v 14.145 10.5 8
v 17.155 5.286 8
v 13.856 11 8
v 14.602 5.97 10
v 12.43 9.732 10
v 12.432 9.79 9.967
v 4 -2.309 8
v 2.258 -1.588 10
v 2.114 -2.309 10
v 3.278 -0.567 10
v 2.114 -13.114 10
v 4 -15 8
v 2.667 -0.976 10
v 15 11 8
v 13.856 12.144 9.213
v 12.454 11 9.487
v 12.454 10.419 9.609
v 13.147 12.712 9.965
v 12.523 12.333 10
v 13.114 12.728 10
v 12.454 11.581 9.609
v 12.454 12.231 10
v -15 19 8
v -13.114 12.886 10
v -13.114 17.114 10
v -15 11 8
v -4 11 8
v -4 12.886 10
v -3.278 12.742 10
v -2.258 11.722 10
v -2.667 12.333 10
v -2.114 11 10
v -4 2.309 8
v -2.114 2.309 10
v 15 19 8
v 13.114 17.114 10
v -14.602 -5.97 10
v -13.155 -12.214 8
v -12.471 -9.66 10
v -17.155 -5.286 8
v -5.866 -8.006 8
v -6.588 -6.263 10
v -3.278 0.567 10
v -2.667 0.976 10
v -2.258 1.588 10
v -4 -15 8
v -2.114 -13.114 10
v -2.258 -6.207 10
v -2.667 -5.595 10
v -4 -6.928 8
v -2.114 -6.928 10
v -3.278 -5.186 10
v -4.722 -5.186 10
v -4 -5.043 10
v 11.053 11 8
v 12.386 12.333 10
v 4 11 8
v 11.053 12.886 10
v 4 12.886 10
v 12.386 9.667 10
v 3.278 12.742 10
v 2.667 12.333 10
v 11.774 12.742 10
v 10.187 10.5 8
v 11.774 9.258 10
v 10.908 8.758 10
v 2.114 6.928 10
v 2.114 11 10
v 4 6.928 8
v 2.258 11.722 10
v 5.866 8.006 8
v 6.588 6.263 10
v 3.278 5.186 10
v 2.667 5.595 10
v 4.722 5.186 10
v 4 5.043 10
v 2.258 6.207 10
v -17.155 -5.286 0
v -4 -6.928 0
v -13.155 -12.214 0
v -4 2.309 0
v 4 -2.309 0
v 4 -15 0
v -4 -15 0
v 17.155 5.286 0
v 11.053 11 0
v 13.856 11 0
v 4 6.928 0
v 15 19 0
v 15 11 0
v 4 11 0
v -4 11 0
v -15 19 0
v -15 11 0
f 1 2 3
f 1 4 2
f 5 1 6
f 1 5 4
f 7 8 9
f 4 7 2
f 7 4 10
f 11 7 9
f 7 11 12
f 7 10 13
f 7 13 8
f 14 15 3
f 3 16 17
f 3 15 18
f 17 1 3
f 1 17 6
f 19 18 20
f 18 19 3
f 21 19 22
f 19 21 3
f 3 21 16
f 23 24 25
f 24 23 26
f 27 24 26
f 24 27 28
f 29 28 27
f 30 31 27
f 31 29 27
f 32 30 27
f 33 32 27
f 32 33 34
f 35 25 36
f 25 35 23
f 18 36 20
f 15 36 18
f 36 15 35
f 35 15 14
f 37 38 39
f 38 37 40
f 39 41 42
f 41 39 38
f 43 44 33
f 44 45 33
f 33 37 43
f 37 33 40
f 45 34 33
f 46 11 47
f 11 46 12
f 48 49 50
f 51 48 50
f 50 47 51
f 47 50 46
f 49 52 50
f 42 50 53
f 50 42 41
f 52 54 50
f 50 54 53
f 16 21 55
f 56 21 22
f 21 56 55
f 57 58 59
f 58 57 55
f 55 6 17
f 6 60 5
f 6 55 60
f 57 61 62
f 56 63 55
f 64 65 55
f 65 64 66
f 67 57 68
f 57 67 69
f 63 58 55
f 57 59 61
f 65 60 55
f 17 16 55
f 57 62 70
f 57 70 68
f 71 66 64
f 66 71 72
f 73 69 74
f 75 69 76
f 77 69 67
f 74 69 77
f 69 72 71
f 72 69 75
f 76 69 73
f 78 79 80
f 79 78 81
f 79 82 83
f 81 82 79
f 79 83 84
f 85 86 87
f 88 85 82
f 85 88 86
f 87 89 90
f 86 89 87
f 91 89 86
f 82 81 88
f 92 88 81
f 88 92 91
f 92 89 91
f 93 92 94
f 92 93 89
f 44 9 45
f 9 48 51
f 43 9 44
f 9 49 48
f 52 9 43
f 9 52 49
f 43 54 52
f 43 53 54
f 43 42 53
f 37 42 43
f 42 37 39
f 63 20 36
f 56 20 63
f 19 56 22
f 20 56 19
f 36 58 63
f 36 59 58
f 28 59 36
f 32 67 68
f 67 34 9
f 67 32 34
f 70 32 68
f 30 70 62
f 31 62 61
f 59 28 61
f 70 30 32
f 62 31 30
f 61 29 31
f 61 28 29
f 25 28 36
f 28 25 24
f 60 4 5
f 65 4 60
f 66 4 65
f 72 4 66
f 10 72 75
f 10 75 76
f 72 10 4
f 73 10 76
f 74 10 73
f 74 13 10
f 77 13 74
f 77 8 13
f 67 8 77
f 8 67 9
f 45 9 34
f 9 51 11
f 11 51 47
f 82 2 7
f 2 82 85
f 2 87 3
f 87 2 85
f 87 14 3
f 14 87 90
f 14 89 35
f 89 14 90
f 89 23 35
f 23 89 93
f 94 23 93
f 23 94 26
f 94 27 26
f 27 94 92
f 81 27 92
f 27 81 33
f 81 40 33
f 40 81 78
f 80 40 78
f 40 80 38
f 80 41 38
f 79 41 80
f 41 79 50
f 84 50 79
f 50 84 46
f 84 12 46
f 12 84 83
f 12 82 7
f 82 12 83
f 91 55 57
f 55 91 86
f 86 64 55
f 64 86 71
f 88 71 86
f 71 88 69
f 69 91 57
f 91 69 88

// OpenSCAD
bevel_extrude_example();

module bevel_extrude_example()
{
	bevel_extrude(height=10,bevel_depth=2,$fn=16) 
	example_shape();
}

module example_shape()
{
	union()
	{
		square([8,30],true);
		rotate(30)
		square([35,8],true);
	
		translate([0,15])
		square([30,8],true);
	}
}

module bevel_border(size=1)
{
	difference()
	{
		minkowski()
		{
			child();
			square(size,true);
		}
		child();
	}
}

module bevel_cutaway(bevel_depth=5)
{
	translate([0,0,-bevel_depth])
	minkowski()
	{
		linear_extrude(height=bevel_depth,convexity=5)
		bevel_border(1)
		child();
		cylinder(h=bevel_depth+1,r1=0,r2=bevel_depth*sqrt(2));
	}
}

module bevel_extrude(height=20,bevel_depth=1)
{
	difference()
	{
		linear_extrude(height=height,convexity=5)
		child();

		translate([0,0,height])
		bevel_cutaway(bevel_depth)
		child();
	}	
}
